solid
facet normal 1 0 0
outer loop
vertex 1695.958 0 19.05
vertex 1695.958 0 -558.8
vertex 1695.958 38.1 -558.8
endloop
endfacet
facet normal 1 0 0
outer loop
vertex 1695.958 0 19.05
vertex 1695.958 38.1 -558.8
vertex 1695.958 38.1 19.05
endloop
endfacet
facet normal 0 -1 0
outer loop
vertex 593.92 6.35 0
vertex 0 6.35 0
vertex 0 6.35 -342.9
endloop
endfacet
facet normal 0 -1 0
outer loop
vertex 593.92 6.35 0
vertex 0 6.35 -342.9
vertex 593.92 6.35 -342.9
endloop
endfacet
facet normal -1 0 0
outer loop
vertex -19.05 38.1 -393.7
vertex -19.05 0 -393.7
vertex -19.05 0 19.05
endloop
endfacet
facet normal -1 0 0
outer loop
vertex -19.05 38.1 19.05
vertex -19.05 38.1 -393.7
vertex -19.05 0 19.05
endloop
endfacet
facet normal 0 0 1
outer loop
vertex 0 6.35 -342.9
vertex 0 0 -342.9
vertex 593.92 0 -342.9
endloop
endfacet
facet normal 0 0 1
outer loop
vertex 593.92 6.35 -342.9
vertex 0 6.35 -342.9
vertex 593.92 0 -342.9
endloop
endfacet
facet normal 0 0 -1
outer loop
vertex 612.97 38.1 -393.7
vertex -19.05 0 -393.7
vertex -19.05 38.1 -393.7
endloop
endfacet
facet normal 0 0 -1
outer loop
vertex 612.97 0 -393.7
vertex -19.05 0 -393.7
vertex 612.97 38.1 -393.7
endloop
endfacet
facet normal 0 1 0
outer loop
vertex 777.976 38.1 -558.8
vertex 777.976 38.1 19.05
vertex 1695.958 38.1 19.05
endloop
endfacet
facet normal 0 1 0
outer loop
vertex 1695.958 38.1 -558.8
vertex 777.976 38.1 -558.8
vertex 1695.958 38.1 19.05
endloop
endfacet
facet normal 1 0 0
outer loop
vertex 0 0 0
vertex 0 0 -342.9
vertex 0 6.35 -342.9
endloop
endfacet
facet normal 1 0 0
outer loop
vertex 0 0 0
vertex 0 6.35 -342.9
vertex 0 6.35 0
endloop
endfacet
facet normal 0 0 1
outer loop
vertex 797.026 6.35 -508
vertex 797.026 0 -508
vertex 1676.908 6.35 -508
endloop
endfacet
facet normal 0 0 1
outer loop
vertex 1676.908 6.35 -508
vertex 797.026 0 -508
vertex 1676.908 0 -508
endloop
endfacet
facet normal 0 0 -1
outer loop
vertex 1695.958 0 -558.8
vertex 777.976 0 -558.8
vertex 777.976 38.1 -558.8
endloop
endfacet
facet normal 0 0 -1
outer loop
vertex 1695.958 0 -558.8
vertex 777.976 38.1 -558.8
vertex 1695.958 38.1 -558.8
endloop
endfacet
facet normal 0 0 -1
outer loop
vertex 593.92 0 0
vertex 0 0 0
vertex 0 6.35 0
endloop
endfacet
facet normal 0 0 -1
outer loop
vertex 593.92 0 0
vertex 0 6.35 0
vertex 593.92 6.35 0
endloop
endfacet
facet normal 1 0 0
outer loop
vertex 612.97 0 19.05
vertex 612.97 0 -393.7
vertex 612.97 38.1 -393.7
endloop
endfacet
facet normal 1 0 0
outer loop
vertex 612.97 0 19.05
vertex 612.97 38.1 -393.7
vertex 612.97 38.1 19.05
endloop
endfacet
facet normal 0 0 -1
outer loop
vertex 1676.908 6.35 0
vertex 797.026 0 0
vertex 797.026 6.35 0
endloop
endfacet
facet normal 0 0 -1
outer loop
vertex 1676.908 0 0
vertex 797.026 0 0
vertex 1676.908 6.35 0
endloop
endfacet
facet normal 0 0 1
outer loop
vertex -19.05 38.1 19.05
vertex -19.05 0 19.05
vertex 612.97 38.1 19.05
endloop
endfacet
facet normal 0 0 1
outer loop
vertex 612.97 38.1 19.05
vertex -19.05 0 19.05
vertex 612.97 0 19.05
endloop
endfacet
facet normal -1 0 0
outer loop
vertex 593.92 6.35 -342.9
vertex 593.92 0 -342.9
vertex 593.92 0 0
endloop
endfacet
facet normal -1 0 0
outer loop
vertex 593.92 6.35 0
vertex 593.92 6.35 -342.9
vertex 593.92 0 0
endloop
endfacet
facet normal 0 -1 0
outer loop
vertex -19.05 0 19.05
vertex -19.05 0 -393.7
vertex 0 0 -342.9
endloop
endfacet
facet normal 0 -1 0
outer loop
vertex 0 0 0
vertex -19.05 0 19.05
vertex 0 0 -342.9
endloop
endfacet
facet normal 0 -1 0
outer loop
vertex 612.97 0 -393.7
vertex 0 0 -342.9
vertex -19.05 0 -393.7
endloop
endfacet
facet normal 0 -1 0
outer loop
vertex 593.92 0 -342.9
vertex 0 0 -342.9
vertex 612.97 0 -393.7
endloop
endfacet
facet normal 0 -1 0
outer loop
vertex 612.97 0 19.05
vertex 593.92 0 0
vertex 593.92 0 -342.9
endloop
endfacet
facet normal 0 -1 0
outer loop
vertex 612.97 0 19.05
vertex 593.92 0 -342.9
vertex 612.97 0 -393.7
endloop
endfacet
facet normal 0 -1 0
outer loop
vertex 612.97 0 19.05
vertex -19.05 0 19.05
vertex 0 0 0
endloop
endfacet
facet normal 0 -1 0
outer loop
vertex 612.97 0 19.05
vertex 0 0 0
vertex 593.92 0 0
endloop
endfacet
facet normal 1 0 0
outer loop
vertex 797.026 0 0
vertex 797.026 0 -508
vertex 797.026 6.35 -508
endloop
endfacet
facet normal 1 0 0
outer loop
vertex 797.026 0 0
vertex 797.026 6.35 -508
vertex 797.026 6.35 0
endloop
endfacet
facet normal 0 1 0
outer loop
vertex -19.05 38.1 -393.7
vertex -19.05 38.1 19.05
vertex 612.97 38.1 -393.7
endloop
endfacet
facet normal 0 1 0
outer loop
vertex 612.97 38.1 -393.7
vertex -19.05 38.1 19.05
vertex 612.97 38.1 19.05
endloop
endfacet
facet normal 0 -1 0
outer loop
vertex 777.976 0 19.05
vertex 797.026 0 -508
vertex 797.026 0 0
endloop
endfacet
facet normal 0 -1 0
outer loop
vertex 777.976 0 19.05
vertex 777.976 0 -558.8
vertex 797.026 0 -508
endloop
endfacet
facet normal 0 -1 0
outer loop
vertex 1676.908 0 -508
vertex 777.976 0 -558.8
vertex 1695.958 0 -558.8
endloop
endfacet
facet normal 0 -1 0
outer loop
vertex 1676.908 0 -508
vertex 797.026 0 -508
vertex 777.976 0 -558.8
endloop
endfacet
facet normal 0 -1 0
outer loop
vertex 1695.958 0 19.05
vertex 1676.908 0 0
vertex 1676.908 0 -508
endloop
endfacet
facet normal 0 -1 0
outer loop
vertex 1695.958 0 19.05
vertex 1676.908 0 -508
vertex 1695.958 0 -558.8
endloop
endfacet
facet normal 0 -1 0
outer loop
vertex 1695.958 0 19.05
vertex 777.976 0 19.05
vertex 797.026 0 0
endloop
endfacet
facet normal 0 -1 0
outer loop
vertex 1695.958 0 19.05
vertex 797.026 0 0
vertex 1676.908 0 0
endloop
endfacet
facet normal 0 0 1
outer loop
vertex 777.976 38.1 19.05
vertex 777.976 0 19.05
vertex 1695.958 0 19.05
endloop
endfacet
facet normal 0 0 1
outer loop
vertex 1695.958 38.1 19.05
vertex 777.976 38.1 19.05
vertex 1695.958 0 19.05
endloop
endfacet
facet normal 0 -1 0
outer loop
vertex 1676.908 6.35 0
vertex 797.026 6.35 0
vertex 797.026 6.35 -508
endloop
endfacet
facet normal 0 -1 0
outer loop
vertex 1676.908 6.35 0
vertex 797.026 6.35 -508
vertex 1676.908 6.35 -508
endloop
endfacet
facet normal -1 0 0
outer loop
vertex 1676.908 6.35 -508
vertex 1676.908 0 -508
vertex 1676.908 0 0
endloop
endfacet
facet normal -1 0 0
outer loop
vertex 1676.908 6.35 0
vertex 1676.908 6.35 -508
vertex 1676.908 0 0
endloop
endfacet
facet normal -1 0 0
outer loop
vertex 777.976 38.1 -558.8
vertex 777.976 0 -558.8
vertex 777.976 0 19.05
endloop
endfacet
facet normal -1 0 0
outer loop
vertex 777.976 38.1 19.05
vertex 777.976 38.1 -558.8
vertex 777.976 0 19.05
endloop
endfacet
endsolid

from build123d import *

# Parameters (mm, degrees)
F0_W     = 632.020222
F0_H     = 412.75
F0_W_2   = 593.920222
F0_H_2   = 342.9
F0_W_3   = 917.981811
F0_H_3   = 577.85
F0_W_4   = 879.881811
F0_H_4   = 508
F1_DEPTH = 38.1
F2_DEPTH = 38.1
F3_DEPTH = 6.35


with BuildPart() as f1:
    # F0 (on Front) → F1 (new body)
    with BuildSketch(Plane.XZ):
        with Locations((296.960111, -187.325)):
            Rectangle(F0_W, F0_H)
        with Locations((296.960111, -171.45)):
            Rectangle(F0_W_2, F0_H_2, mode=Mode.SUBTRACT)
        with Locations((1236.967296, -269.875)):
            Rectangle(F0_W_3, F0_H_3)
        with Locations((1236.967296, -254)):
            Rectangle(F0_W_4, F0_H_4, mode=Mode.SUBTRACT)
    extrude(amount=-F1_DEPTH)

    # F0 (on Front) → F2 (join)
    with BuildSketch(Plane.XZ):
        with Locations((296.960111, -171.45)):
            Rectangle(F0_W_2, F0_H_2)
        with Locations((1236.967296, -254)):
            Rectangle(F0_W_4, F0_H_4)
    extrude(amount=-F2_DEPTH)

    # F0 (on Front) → F3 (cut)
    with BuildSketch(Plane.XZ):
        with Locations((296.960111, -171.45)):
            Rectangle(F0_W_2, F0_H_2)
        with Locations((1236.967296, -254)):
            Rectangle(F0_W_4, F0_H_4)
    extrude(amount=-F3_DEPTH, mode=Mode.SUBTRACT)


solid = f1.part
